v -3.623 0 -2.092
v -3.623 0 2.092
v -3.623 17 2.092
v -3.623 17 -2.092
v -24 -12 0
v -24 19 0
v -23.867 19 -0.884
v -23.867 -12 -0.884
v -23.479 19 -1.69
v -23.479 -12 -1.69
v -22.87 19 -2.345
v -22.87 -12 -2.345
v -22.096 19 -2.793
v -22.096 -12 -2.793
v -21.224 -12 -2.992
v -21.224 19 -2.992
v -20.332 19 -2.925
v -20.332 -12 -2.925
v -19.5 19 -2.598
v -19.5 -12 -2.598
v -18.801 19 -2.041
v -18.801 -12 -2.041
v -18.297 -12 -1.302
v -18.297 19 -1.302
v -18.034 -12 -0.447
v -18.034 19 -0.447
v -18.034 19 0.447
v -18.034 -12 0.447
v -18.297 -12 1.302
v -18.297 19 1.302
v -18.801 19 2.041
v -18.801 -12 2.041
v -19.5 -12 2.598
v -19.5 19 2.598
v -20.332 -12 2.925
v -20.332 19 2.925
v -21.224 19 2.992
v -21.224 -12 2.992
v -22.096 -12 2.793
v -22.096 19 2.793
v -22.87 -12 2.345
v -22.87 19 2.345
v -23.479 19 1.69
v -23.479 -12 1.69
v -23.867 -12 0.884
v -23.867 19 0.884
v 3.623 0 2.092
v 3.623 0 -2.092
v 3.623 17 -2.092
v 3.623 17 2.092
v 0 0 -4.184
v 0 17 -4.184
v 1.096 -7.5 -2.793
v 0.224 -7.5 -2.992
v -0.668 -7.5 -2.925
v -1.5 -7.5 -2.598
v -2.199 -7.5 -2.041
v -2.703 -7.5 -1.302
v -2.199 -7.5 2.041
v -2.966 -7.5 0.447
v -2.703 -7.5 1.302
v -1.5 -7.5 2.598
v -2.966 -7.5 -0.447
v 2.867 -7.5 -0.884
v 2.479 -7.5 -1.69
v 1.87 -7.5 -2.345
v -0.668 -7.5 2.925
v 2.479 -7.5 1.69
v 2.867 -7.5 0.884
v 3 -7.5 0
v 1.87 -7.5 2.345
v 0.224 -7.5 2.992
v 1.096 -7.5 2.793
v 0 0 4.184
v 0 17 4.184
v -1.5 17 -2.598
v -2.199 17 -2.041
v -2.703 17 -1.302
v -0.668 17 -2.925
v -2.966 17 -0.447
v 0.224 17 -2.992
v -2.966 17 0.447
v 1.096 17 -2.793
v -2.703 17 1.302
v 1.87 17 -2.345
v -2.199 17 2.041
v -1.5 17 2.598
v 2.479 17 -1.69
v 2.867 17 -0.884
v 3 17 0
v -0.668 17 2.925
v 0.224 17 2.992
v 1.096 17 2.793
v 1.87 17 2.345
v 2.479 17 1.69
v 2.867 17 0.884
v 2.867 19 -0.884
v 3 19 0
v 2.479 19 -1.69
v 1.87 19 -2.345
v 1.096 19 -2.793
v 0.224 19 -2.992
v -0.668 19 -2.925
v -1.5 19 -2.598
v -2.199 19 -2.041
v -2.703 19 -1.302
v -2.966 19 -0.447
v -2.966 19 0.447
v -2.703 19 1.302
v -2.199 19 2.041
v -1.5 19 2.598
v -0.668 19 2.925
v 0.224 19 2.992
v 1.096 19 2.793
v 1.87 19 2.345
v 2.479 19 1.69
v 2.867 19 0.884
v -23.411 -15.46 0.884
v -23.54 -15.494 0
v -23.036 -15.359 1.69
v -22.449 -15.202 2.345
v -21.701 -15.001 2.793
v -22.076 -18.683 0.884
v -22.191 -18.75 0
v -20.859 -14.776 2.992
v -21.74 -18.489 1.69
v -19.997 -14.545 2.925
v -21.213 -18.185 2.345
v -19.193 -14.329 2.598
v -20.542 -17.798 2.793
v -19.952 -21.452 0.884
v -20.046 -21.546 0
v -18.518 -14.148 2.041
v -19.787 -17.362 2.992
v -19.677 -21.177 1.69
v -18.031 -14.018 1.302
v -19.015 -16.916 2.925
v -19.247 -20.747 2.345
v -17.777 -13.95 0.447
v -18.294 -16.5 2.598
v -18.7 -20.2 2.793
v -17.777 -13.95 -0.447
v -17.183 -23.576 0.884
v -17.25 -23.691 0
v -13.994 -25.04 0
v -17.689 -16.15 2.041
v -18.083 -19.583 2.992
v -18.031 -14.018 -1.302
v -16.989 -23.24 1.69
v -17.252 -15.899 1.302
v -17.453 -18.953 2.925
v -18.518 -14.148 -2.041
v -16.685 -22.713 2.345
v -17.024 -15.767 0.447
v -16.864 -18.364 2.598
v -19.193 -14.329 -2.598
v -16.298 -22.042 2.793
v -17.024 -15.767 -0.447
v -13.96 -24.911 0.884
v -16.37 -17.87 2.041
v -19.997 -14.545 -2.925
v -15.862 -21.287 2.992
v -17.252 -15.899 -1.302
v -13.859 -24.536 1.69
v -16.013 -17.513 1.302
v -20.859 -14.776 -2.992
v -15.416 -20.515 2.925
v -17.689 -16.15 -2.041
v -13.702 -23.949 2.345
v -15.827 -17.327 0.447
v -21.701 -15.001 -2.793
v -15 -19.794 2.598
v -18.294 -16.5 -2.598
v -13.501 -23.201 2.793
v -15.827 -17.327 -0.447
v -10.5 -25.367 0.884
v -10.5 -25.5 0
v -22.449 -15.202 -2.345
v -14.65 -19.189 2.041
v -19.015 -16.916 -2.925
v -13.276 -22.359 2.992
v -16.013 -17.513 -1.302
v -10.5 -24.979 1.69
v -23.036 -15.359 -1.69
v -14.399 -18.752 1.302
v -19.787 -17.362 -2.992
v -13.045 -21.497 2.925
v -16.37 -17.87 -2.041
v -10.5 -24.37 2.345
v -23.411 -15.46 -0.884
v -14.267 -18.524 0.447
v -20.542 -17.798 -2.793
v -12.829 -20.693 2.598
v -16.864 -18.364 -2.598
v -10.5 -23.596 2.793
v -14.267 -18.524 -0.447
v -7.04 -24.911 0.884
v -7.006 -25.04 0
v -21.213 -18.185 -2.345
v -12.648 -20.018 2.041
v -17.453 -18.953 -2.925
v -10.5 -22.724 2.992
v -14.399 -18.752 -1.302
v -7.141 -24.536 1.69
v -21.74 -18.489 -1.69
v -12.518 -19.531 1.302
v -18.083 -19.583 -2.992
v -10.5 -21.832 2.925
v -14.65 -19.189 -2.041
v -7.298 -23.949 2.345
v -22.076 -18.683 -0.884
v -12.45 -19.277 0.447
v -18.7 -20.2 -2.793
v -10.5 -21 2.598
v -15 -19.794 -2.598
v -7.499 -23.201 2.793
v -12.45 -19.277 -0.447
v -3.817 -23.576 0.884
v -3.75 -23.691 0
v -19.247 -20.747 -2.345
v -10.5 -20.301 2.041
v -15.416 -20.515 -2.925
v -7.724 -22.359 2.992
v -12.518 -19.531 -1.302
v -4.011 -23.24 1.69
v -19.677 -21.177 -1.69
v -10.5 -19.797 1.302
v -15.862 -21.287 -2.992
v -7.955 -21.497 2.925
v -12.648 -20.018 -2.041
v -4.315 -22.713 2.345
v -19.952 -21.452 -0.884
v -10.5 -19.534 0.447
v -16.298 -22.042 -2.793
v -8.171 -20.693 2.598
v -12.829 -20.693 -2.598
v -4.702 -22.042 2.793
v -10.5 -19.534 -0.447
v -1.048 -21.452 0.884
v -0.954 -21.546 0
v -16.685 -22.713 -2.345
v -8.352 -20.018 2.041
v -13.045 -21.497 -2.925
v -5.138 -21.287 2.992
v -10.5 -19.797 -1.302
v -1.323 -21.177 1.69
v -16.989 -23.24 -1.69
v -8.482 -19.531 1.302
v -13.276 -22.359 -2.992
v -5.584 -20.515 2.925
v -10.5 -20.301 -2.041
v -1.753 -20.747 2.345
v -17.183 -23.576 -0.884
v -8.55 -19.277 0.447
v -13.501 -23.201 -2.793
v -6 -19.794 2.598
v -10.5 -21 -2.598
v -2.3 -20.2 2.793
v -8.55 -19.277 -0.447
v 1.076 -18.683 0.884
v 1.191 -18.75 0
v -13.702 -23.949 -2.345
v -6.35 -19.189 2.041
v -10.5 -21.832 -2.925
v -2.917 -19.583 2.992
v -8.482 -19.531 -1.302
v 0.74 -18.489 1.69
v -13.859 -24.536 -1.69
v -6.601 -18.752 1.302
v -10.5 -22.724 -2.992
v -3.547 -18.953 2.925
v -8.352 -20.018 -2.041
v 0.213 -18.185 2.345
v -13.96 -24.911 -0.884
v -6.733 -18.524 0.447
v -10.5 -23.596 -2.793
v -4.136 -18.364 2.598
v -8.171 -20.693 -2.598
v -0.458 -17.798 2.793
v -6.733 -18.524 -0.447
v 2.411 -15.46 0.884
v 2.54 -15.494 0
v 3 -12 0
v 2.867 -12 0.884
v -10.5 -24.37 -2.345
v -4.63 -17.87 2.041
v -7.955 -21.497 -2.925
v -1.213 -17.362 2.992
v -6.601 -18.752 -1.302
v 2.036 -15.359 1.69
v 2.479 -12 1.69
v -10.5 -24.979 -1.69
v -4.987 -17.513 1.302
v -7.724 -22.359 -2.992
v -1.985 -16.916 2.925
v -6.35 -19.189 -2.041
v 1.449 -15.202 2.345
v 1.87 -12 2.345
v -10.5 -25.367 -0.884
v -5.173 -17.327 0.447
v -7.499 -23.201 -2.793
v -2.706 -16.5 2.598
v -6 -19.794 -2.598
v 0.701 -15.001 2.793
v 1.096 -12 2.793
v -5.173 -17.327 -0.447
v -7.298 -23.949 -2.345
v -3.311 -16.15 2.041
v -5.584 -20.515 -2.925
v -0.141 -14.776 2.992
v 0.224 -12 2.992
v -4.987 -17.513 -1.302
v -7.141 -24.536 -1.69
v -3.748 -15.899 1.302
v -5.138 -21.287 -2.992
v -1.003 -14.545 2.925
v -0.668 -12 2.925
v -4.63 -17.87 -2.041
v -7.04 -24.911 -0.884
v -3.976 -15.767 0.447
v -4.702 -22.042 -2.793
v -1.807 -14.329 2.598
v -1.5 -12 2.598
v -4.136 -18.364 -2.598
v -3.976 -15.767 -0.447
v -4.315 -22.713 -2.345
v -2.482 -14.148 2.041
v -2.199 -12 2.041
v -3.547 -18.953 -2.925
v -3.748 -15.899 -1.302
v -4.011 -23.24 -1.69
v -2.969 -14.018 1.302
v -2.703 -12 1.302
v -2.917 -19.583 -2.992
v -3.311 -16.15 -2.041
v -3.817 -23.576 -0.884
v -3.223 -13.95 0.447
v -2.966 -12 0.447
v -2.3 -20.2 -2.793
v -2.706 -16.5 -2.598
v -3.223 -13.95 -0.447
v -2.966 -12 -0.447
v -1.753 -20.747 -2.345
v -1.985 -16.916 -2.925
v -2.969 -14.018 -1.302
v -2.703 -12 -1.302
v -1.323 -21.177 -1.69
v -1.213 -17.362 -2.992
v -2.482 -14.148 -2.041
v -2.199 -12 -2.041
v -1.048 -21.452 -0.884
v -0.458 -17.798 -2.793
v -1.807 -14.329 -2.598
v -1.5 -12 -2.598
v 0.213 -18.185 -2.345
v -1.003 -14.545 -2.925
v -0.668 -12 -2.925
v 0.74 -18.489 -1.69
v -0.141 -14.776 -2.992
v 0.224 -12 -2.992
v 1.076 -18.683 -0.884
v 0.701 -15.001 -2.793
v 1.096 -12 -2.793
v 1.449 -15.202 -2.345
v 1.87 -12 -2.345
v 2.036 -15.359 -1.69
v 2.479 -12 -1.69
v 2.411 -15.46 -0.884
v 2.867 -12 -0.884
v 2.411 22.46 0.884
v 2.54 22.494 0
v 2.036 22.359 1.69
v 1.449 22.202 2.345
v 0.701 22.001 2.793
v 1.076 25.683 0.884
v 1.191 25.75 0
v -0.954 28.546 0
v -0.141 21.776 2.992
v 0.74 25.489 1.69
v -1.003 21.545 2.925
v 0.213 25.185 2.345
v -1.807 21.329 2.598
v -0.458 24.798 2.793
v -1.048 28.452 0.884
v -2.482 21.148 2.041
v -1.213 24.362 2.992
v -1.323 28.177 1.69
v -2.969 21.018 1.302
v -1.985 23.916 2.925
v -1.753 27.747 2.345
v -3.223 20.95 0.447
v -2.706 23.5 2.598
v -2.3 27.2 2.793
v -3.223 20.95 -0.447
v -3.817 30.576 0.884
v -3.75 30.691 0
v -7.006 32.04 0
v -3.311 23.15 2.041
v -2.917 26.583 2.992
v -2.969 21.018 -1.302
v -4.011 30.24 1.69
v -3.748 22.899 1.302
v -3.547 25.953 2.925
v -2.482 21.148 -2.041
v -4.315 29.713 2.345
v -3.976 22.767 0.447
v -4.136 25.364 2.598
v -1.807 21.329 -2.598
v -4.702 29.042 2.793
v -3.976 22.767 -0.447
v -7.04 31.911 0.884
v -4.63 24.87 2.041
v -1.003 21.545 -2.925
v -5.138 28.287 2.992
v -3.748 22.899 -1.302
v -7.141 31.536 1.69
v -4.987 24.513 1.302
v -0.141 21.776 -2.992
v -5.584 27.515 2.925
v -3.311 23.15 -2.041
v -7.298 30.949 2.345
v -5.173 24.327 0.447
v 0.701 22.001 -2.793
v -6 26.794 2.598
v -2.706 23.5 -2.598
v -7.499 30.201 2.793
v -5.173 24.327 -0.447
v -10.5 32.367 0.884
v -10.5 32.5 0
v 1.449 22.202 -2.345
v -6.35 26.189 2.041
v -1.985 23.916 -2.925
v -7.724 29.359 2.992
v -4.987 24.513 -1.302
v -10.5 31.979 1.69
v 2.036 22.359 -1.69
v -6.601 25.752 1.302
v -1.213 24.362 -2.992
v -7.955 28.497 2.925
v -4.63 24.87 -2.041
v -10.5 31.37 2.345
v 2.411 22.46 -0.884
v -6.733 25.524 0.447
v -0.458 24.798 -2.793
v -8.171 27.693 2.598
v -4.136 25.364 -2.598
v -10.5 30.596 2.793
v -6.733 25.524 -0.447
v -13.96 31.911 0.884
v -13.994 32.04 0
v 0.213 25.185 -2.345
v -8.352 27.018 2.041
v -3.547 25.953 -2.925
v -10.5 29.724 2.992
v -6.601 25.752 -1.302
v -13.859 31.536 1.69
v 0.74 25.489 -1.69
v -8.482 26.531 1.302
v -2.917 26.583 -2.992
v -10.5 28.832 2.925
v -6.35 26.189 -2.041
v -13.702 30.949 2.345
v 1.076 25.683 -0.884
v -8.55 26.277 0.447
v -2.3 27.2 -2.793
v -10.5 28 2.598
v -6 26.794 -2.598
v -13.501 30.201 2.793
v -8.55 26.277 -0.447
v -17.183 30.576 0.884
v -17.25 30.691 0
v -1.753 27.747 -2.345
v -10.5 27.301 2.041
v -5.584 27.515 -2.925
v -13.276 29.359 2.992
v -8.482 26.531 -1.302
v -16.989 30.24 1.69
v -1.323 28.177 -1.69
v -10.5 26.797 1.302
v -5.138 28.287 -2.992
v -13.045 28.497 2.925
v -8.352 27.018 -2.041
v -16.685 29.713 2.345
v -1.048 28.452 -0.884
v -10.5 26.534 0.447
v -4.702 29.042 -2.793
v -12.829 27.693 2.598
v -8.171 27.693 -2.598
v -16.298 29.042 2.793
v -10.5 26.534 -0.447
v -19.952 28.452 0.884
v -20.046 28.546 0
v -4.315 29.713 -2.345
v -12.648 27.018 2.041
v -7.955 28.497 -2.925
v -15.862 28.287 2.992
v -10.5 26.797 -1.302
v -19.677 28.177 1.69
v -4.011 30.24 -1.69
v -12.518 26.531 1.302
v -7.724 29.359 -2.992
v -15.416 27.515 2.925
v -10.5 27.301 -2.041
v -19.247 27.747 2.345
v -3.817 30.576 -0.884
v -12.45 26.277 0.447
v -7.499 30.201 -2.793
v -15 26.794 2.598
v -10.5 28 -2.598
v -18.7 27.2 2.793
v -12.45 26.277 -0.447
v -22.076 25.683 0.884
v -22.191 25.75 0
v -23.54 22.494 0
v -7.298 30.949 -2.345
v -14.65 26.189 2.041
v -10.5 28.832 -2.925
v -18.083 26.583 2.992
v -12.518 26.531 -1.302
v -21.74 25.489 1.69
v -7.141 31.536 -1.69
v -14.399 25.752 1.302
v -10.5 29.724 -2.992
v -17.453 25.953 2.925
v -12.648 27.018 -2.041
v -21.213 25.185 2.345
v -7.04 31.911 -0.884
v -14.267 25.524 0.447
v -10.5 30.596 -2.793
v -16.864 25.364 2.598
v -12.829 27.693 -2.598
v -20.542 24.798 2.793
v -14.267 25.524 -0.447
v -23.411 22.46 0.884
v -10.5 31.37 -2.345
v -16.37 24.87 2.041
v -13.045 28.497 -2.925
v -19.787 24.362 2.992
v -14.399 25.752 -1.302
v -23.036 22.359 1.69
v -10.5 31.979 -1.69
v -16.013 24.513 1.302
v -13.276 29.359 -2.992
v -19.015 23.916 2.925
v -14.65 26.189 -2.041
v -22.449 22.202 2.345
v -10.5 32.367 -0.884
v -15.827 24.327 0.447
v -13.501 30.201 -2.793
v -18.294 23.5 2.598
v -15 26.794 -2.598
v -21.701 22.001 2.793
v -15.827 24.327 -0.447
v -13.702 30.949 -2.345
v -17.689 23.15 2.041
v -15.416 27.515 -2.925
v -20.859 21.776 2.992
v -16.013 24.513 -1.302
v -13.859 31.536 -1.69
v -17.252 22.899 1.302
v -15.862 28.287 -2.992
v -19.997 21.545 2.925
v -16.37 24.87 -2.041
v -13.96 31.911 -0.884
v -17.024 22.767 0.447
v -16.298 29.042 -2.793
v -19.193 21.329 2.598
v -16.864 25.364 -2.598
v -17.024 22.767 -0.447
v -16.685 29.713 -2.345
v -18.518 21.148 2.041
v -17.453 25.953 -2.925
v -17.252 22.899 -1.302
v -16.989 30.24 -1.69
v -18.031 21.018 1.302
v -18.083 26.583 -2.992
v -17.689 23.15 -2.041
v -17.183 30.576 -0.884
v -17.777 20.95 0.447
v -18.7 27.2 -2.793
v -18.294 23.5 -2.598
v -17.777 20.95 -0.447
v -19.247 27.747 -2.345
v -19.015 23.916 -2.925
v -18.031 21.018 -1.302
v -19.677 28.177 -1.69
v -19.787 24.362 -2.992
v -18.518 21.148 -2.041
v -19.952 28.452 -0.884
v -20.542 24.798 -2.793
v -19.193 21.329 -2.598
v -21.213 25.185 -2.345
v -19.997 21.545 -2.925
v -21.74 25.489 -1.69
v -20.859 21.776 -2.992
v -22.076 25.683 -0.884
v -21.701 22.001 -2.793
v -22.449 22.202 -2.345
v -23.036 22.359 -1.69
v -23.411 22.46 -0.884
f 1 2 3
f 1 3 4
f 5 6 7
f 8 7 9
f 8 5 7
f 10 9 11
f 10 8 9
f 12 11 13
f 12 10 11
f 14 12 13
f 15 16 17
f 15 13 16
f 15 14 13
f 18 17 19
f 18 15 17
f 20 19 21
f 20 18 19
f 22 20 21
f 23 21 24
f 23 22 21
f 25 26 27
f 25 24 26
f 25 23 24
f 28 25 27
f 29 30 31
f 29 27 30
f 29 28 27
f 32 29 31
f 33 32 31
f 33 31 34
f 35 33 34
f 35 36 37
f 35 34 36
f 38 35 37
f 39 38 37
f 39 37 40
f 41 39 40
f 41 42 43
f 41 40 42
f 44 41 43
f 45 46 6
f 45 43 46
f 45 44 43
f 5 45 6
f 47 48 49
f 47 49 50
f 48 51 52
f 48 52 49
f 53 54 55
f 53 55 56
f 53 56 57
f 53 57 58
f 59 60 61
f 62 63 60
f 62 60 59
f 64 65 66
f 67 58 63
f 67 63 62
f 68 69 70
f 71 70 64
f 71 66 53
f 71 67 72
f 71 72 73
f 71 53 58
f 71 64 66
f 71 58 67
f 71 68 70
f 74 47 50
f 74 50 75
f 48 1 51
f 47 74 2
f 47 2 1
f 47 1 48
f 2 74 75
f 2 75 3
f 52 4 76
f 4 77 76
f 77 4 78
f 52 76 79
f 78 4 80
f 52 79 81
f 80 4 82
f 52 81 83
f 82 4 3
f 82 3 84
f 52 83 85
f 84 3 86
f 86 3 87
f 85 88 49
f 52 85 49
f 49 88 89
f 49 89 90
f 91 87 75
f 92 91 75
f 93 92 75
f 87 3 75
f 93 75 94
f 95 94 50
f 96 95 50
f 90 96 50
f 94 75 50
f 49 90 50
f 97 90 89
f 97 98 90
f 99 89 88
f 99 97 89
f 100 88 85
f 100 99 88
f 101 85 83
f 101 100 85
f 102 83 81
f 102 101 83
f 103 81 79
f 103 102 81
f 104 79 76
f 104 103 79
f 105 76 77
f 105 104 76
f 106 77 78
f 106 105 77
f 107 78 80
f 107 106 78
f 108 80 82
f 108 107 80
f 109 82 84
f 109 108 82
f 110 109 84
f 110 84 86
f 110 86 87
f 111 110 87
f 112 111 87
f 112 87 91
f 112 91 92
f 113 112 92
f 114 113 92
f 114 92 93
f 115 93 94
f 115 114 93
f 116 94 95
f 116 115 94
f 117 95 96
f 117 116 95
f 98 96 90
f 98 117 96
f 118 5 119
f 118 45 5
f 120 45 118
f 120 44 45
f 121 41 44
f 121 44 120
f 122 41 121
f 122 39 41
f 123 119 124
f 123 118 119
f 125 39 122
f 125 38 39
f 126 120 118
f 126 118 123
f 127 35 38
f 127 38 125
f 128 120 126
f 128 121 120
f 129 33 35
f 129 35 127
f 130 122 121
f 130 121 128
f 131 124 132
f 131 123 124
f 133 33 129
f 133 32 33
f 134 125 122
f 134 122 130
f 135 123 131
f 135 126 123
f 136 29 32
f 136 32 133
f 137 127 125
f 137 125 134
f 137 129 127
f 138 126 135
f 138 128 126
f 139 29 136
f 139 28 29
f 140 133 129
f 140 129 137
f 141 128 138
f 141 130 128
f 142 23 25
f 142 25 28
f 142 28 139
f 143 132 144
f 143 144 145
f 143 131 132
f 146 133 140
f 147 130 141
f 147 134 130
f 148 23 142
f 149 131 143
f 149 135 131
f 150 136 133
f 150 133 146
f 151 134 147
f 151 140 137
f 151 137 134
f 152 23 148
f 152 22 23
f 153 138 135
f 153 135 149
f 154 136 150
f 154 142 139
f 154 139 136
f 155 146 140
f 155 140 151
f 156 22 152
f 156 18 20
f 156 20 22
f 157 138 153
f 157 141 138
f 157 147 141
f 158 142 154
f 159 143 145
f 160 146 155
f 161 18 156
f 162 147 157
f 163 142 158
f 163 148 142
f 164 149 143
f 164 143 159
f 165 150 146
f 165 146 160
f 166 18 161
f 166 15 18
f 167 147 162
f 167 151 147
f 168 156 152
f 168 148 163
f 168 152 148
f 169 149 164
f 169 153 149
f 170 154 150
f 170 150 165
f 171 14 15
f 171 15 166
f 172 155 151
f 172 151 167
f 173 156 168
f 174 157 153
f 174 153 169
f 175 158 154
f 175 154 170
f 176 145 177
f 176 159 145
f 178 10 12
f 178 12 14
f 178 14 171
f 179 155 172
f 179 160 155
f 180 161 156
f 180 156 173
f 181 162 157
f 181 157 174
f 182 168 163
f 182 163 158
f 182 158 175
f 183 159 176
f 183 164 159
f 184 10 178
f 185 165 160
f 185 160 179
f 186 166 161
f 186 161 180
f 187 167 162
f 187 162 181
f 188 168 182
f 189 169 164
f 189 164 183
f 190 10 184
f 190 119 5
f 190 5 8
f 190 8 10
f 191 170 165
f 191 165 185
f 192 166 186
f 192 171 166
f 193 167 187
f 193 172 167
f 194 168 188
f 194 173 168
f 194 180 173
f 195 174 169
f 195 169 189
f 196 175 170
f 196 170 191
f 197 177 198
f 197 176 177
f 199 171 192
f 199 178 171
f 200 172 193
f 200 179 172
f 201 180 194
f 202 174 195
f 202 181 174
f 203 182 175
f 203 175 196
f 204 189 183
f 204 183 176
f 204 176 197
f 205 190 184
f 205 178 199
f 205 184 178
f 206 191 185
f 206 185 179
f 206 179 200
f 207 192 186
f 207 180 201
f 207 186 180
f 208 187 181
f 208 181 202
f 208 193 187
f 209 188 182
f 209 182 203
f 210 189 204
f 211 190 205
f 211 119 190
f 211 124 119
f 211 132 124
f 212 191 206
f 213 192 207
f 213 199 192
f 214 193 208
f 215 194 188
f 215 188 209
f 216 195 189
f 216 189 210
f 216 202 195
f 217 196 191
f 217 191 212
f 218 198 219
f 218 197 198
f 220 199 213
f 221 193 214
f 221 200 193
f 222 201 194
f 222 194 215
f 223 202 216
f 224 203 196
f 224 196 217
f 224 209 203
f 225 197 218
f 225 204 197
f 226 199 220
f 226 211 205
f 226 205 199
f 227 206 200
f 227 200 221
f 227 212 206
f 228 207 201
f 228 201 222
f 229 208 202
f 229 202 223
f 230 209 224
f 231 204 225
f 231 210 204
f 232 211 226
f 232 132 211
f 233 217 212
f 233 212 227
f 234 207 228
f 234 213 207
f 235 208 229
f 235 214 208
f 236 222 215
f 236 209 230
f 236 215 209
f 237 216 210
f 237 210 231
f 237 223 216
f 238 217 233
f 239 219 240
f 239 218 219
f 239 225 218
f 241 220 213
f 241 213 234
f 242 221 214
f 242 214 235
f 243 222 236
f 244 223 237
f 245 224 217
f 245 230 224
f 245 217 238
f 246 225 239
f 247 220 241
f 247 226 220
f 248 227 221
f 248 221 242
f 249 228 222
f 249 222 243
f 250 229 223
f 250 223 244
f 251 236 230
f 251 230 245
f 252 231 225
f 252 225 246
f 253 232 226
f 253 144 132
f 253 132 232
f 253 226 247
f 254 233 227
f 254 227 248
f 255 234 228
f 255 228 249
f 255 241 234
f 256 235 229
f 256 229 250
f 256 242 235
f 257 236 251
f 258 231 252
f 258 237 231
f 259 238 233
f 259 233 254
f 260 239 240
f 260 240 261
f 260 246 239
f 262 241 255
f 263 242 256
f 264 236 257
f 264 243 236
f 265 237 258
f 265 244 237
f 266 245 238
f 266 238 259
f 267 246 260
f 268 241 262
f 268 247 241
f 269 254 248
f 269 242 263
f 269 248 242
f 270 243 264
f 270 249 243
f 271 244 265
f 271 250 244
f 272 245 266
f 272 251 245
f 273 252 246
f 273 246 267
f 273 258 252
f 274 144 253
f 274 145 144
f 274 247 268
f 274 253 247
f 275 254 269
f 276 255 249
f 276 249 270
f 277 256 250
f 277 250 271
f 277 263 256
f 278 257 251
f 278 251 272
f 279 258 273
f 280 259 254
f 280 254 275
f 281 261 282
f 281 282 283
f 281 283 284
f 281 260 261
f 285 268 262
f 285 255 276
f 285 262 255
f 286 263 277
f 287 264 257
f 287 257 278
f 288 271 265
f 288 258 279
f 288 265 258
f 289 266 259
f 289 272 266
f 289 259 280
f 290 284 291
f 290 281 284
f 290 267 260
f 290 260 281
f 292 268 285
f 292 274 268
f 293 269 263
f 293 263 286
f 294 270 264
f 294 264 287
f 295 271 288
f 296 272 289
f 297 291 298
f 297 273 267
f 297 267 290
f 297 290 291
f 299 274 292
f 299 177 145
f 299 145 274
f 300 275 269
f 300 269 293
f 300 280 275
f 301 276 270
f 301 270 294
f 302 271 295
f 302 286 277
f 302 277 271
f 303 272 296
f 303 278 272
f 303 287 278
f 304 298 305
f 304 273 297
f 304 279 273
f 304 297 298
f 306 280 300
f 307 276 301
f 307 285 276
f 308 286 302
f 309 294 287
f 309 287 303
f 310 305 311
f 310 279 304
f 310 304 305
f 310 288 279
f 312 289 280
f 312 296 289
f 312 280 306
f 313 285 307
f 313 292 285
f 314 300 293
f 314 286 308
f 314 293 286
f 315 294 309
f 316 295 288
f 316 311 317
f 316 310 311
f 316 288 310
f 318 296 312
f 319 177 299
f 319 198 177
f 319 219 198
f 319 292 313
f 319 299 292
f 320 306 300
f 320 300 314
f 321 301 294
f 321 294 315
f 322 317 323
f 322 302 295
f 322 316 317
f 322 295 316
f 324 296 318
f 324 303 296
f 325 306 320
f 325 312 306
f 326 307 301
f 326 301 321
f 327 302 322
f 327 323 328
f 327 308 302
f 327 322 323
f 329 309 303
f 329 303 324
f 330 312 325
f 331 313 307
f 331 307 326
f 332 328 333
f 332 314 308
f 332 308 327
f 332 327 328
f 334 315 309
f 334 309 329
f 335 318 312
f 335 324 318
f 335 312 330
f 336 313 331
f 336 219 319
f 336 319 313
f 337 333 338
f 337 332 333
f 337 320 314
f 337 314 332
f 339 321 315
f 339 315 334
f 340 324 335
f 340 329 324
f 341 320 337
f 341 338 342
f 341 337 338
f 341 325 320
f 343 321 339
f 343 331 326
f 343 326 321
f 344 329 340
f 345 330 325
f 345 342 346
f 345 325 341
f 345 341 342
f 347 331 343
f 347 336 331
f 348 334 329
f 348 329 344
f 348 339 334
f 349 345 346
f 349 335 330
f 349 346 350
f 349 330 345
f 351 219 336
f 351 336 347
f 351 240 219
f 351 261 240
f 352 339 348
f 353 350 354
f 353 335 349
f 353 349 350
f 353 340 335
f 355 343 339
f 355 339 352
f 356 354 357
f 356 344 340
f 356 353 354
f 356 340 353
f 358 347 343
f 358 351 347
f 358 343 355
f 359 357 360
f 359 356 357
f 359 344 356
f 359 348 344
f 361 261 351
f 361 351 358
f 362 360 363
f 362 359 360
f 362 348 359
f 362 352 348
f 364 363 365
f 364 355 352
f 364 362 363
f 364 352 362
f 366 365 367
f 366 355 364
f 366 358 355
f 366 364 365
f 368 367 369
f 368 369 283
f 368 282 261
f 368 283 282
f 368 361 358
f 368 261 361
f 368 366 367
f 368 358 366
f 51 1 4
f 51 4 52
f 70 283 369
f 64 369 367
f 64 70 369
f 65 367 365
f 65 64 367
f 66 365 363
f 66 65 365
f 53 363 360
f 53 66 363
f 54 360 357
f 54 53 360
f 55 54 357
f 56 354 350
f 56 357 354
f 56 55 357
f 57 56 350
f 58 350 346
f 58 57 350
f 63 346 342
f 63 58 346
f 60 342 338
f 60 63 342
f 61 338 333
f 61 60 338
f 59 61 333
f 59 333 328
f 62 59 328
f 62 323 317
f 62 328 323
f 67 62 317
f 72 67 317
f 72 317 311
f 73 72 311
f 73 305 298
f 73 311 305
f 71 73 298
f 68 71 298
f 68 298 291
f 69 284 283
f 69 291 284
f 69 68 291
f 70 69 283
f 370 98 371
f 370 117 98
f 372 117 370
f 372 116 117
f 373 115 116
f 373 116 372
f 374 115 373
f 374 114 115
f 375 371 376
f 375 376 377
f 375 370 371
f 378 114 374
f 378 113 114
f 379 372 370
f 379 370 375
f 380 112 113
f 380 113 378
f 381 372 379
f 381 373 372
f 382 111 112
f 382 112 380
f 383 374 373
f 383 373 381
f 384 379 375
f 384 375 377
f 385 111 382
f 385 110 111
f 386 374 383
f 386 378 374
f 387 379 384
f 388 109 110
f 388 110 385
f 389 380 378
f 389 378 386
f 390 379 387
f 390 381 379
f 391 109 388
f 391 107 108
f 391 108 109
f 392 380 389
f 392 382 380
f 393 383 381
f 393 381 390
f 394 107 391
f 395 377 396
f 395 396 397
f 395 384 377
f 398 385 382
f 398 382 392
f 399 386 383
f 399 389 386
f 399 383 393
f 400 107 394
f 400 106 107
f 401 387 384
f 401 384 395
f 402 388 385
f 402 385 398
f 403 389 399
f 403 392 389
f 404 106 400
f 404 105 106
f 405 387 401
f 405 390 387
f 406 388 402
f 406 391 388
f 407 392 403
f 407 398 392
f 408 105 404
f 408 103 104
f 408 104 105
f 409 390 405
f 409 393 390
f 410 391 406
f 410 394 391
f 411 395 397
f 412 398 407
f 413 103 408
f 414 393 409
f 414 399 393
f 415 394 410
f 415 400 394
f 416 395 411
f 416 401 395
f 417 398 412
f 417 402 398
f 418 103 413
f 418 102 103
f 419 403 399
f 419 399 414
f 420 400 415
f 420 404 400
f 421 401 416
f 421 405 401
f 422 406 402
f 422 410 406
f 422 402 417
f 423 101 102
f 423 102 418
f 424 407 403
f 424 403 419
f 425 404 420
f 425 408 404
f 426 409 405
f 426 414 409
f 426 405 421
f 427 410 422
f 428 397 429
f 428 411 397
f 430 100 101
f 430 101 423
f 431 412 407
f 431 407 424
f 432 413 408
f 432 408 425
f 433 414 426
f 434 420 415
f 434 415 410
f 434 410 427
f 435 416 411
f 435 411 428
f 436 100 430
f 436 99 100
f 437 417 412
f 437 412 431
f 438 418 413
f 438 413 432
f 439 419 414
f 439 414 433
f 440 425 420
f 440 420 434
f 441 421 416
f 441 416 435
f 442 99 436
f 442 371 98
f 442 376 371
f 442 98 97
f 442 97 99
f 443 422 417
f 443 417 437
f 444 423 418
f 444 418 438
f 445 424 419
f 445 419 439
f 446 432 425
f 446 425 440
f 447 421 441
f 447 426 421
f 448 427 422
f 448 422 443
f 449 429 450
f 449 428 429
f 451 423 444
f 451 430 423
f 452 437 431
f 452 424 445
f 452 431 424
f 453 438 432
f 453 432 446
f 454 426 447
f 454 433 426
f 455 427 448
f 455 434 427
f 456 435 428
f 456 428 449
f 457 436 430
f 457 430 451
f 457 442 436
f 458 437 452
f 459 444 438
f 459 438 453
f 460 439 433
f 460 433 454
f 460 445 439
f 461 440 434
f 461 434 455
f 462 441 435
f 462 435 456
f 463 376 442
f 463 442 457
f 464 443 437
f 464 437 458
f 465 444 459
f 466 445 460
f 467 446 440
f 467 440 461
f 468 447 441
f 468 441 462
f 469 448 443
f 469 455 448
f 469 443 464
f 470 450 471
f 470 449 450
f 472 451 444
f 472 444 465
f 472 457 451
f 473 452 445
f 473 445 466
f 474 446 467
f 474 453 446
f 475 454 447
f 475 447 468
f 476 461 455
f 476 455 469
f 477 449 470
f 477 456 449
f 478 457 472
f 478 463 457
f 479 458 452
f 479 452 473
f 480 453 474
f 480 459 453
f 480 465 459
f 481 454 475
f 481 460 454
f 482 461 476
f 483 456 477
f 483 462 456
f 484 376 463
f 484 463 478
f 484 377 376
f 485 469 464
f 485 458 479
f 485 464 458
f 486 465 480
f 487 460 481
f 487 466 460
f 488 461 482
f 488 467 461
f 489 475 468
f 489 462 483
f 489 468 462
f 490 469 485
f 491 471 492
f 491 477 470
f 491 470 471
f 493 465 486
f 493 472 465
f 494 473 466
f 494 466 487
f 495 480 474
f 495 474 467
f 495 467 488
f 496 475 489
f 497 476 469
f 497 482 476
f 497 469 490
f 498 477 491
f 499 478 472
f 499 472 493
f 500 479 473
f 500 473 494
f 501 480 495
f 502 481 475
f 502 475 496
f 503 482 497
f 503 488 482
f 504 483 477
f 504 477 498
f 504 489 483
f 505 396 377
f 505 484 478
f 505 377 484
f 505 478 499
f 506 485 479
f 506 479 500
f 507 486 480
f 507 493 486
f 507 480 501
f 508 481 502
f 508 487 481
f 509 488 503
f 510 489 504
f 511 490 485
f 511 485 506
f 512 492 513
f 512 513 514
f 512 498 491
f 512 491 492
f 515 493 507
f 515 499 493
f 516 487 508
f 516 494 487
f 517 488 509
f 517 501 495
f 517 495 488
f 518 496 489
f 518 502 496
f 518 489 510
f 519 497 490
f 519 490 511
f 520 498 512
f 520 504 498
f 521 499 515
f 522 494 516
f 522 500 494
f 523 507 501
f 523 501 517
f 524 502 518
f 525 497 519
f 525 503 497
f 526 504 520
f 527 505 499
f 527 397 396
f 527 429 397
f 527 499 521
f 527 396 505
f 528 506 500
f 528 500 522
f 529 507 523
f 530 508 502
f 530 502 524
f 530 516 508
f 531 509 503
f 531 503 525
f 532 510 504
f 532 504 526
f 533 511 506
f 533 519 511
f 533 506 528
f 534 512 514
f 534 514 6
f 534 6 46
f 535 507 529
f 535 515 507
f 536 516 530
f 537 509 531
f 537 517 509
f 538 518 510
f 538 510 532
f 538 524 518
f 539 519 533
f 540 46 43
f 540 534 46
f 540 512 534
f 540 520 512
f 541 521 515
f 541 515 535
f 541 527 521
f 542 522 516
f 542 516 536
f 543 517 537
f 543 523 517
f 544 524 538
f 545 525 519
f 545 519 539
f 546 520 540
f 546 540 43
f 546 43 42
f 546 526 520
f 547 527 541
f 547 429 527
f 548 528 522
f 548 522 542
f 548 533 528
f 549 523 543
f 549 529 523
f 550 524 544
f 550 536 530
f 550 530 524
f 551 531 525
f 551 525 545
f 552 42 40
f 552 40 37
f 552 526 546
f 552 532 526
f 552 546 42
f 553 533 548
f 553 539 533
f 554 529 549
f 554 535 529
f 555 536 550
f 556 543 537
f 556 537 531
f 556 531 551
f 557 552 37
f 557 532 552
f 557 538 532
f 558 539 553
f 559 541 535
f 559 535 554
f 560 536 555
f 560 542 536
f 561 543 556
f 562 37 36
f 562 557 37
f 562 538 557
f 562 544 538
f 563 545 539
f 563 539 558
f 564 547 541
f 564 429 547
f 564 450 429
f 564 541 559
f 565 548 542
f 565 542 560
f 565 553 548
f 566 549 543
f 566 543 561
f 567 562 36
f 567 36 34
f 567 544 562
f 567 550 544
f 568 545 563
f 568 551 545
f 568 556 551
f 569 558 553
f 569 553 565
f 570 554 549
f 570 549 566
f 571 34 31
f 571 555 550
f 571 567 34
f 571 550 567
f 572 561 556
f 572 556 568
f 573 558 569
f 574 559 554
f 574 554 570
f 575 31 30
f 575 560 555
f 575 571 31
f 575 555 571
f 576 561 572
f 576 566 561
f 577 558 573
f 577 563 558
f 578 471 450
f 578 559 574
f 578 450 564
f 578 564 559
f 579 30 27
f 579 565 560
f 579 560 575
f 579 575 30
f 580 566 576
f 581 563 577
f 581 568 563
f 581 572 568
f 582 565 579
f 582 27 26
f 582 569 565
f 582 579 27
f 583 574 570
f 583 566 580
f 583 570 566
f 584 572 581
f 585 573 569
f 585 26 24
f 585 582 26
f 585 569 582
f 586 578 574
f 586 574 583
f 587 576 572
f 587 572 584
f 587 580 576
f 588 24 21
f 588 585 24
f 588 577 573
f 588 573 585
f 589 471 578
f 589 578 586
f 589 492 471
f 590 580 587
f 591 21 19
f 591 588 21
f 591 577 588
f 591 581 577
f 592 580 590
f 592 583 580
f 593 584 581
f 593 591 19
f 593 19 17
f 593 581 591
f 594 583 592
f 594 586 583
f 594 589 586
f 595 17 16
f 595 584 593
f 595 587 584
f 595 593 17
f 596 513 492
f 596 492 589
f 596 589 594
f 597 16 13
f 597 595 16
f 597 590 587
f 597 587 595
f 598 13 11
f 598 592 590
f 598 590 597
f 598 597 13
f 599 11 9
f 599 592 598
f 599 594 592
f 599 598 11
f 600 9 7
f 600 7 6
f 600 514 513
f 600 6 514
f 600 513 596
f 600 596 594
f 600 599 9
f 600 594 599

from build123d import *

# Parameters (mm, degrees)
SKETCH1_R           = 3
BOSS_EXTRUDE1_DEPTH = 17


with BuildPart() as part:
    # Sweep1: sweep along a path in Sketch2
    with BuildLine(Plane.XY) as sweep1_path:
        Line((0, 0), (0, 19))
        ThreePointArc((0, 19), (-10.5, 29.5), (-21, 19))
        Line((-21, 19), (-21, -12))
        ThreePointArc((-21, -12), (-10.5, -22.5), (0, -12))
        Line((0, -12), (0, -7.5))
    # Sketch1 → Sweep1 (sweep)
    with BuildSketch(Plane(origin=(0, 0, 0), x_dir=(1, 0, 0), z_dir=(0, 1, 0))):
        Circle(SKETCH1_R)
    sweep(path=sweep1_path.line)

    # Sketch3 → Boss-Extrude1 (add)
    with BuildSketch(Plane.XZ):
        Polygon((3.623304072, 2.091915581), (0, 4.183831163), (-3.623304072, 2.091915581), (-3.623304072, -2.091915581), (0, -4.183831163), (3.623304072, -2.091915581), align=None)
    extrude(amount=-BOSS_EXTRUDE1_DEPTH)


solid = part.part
